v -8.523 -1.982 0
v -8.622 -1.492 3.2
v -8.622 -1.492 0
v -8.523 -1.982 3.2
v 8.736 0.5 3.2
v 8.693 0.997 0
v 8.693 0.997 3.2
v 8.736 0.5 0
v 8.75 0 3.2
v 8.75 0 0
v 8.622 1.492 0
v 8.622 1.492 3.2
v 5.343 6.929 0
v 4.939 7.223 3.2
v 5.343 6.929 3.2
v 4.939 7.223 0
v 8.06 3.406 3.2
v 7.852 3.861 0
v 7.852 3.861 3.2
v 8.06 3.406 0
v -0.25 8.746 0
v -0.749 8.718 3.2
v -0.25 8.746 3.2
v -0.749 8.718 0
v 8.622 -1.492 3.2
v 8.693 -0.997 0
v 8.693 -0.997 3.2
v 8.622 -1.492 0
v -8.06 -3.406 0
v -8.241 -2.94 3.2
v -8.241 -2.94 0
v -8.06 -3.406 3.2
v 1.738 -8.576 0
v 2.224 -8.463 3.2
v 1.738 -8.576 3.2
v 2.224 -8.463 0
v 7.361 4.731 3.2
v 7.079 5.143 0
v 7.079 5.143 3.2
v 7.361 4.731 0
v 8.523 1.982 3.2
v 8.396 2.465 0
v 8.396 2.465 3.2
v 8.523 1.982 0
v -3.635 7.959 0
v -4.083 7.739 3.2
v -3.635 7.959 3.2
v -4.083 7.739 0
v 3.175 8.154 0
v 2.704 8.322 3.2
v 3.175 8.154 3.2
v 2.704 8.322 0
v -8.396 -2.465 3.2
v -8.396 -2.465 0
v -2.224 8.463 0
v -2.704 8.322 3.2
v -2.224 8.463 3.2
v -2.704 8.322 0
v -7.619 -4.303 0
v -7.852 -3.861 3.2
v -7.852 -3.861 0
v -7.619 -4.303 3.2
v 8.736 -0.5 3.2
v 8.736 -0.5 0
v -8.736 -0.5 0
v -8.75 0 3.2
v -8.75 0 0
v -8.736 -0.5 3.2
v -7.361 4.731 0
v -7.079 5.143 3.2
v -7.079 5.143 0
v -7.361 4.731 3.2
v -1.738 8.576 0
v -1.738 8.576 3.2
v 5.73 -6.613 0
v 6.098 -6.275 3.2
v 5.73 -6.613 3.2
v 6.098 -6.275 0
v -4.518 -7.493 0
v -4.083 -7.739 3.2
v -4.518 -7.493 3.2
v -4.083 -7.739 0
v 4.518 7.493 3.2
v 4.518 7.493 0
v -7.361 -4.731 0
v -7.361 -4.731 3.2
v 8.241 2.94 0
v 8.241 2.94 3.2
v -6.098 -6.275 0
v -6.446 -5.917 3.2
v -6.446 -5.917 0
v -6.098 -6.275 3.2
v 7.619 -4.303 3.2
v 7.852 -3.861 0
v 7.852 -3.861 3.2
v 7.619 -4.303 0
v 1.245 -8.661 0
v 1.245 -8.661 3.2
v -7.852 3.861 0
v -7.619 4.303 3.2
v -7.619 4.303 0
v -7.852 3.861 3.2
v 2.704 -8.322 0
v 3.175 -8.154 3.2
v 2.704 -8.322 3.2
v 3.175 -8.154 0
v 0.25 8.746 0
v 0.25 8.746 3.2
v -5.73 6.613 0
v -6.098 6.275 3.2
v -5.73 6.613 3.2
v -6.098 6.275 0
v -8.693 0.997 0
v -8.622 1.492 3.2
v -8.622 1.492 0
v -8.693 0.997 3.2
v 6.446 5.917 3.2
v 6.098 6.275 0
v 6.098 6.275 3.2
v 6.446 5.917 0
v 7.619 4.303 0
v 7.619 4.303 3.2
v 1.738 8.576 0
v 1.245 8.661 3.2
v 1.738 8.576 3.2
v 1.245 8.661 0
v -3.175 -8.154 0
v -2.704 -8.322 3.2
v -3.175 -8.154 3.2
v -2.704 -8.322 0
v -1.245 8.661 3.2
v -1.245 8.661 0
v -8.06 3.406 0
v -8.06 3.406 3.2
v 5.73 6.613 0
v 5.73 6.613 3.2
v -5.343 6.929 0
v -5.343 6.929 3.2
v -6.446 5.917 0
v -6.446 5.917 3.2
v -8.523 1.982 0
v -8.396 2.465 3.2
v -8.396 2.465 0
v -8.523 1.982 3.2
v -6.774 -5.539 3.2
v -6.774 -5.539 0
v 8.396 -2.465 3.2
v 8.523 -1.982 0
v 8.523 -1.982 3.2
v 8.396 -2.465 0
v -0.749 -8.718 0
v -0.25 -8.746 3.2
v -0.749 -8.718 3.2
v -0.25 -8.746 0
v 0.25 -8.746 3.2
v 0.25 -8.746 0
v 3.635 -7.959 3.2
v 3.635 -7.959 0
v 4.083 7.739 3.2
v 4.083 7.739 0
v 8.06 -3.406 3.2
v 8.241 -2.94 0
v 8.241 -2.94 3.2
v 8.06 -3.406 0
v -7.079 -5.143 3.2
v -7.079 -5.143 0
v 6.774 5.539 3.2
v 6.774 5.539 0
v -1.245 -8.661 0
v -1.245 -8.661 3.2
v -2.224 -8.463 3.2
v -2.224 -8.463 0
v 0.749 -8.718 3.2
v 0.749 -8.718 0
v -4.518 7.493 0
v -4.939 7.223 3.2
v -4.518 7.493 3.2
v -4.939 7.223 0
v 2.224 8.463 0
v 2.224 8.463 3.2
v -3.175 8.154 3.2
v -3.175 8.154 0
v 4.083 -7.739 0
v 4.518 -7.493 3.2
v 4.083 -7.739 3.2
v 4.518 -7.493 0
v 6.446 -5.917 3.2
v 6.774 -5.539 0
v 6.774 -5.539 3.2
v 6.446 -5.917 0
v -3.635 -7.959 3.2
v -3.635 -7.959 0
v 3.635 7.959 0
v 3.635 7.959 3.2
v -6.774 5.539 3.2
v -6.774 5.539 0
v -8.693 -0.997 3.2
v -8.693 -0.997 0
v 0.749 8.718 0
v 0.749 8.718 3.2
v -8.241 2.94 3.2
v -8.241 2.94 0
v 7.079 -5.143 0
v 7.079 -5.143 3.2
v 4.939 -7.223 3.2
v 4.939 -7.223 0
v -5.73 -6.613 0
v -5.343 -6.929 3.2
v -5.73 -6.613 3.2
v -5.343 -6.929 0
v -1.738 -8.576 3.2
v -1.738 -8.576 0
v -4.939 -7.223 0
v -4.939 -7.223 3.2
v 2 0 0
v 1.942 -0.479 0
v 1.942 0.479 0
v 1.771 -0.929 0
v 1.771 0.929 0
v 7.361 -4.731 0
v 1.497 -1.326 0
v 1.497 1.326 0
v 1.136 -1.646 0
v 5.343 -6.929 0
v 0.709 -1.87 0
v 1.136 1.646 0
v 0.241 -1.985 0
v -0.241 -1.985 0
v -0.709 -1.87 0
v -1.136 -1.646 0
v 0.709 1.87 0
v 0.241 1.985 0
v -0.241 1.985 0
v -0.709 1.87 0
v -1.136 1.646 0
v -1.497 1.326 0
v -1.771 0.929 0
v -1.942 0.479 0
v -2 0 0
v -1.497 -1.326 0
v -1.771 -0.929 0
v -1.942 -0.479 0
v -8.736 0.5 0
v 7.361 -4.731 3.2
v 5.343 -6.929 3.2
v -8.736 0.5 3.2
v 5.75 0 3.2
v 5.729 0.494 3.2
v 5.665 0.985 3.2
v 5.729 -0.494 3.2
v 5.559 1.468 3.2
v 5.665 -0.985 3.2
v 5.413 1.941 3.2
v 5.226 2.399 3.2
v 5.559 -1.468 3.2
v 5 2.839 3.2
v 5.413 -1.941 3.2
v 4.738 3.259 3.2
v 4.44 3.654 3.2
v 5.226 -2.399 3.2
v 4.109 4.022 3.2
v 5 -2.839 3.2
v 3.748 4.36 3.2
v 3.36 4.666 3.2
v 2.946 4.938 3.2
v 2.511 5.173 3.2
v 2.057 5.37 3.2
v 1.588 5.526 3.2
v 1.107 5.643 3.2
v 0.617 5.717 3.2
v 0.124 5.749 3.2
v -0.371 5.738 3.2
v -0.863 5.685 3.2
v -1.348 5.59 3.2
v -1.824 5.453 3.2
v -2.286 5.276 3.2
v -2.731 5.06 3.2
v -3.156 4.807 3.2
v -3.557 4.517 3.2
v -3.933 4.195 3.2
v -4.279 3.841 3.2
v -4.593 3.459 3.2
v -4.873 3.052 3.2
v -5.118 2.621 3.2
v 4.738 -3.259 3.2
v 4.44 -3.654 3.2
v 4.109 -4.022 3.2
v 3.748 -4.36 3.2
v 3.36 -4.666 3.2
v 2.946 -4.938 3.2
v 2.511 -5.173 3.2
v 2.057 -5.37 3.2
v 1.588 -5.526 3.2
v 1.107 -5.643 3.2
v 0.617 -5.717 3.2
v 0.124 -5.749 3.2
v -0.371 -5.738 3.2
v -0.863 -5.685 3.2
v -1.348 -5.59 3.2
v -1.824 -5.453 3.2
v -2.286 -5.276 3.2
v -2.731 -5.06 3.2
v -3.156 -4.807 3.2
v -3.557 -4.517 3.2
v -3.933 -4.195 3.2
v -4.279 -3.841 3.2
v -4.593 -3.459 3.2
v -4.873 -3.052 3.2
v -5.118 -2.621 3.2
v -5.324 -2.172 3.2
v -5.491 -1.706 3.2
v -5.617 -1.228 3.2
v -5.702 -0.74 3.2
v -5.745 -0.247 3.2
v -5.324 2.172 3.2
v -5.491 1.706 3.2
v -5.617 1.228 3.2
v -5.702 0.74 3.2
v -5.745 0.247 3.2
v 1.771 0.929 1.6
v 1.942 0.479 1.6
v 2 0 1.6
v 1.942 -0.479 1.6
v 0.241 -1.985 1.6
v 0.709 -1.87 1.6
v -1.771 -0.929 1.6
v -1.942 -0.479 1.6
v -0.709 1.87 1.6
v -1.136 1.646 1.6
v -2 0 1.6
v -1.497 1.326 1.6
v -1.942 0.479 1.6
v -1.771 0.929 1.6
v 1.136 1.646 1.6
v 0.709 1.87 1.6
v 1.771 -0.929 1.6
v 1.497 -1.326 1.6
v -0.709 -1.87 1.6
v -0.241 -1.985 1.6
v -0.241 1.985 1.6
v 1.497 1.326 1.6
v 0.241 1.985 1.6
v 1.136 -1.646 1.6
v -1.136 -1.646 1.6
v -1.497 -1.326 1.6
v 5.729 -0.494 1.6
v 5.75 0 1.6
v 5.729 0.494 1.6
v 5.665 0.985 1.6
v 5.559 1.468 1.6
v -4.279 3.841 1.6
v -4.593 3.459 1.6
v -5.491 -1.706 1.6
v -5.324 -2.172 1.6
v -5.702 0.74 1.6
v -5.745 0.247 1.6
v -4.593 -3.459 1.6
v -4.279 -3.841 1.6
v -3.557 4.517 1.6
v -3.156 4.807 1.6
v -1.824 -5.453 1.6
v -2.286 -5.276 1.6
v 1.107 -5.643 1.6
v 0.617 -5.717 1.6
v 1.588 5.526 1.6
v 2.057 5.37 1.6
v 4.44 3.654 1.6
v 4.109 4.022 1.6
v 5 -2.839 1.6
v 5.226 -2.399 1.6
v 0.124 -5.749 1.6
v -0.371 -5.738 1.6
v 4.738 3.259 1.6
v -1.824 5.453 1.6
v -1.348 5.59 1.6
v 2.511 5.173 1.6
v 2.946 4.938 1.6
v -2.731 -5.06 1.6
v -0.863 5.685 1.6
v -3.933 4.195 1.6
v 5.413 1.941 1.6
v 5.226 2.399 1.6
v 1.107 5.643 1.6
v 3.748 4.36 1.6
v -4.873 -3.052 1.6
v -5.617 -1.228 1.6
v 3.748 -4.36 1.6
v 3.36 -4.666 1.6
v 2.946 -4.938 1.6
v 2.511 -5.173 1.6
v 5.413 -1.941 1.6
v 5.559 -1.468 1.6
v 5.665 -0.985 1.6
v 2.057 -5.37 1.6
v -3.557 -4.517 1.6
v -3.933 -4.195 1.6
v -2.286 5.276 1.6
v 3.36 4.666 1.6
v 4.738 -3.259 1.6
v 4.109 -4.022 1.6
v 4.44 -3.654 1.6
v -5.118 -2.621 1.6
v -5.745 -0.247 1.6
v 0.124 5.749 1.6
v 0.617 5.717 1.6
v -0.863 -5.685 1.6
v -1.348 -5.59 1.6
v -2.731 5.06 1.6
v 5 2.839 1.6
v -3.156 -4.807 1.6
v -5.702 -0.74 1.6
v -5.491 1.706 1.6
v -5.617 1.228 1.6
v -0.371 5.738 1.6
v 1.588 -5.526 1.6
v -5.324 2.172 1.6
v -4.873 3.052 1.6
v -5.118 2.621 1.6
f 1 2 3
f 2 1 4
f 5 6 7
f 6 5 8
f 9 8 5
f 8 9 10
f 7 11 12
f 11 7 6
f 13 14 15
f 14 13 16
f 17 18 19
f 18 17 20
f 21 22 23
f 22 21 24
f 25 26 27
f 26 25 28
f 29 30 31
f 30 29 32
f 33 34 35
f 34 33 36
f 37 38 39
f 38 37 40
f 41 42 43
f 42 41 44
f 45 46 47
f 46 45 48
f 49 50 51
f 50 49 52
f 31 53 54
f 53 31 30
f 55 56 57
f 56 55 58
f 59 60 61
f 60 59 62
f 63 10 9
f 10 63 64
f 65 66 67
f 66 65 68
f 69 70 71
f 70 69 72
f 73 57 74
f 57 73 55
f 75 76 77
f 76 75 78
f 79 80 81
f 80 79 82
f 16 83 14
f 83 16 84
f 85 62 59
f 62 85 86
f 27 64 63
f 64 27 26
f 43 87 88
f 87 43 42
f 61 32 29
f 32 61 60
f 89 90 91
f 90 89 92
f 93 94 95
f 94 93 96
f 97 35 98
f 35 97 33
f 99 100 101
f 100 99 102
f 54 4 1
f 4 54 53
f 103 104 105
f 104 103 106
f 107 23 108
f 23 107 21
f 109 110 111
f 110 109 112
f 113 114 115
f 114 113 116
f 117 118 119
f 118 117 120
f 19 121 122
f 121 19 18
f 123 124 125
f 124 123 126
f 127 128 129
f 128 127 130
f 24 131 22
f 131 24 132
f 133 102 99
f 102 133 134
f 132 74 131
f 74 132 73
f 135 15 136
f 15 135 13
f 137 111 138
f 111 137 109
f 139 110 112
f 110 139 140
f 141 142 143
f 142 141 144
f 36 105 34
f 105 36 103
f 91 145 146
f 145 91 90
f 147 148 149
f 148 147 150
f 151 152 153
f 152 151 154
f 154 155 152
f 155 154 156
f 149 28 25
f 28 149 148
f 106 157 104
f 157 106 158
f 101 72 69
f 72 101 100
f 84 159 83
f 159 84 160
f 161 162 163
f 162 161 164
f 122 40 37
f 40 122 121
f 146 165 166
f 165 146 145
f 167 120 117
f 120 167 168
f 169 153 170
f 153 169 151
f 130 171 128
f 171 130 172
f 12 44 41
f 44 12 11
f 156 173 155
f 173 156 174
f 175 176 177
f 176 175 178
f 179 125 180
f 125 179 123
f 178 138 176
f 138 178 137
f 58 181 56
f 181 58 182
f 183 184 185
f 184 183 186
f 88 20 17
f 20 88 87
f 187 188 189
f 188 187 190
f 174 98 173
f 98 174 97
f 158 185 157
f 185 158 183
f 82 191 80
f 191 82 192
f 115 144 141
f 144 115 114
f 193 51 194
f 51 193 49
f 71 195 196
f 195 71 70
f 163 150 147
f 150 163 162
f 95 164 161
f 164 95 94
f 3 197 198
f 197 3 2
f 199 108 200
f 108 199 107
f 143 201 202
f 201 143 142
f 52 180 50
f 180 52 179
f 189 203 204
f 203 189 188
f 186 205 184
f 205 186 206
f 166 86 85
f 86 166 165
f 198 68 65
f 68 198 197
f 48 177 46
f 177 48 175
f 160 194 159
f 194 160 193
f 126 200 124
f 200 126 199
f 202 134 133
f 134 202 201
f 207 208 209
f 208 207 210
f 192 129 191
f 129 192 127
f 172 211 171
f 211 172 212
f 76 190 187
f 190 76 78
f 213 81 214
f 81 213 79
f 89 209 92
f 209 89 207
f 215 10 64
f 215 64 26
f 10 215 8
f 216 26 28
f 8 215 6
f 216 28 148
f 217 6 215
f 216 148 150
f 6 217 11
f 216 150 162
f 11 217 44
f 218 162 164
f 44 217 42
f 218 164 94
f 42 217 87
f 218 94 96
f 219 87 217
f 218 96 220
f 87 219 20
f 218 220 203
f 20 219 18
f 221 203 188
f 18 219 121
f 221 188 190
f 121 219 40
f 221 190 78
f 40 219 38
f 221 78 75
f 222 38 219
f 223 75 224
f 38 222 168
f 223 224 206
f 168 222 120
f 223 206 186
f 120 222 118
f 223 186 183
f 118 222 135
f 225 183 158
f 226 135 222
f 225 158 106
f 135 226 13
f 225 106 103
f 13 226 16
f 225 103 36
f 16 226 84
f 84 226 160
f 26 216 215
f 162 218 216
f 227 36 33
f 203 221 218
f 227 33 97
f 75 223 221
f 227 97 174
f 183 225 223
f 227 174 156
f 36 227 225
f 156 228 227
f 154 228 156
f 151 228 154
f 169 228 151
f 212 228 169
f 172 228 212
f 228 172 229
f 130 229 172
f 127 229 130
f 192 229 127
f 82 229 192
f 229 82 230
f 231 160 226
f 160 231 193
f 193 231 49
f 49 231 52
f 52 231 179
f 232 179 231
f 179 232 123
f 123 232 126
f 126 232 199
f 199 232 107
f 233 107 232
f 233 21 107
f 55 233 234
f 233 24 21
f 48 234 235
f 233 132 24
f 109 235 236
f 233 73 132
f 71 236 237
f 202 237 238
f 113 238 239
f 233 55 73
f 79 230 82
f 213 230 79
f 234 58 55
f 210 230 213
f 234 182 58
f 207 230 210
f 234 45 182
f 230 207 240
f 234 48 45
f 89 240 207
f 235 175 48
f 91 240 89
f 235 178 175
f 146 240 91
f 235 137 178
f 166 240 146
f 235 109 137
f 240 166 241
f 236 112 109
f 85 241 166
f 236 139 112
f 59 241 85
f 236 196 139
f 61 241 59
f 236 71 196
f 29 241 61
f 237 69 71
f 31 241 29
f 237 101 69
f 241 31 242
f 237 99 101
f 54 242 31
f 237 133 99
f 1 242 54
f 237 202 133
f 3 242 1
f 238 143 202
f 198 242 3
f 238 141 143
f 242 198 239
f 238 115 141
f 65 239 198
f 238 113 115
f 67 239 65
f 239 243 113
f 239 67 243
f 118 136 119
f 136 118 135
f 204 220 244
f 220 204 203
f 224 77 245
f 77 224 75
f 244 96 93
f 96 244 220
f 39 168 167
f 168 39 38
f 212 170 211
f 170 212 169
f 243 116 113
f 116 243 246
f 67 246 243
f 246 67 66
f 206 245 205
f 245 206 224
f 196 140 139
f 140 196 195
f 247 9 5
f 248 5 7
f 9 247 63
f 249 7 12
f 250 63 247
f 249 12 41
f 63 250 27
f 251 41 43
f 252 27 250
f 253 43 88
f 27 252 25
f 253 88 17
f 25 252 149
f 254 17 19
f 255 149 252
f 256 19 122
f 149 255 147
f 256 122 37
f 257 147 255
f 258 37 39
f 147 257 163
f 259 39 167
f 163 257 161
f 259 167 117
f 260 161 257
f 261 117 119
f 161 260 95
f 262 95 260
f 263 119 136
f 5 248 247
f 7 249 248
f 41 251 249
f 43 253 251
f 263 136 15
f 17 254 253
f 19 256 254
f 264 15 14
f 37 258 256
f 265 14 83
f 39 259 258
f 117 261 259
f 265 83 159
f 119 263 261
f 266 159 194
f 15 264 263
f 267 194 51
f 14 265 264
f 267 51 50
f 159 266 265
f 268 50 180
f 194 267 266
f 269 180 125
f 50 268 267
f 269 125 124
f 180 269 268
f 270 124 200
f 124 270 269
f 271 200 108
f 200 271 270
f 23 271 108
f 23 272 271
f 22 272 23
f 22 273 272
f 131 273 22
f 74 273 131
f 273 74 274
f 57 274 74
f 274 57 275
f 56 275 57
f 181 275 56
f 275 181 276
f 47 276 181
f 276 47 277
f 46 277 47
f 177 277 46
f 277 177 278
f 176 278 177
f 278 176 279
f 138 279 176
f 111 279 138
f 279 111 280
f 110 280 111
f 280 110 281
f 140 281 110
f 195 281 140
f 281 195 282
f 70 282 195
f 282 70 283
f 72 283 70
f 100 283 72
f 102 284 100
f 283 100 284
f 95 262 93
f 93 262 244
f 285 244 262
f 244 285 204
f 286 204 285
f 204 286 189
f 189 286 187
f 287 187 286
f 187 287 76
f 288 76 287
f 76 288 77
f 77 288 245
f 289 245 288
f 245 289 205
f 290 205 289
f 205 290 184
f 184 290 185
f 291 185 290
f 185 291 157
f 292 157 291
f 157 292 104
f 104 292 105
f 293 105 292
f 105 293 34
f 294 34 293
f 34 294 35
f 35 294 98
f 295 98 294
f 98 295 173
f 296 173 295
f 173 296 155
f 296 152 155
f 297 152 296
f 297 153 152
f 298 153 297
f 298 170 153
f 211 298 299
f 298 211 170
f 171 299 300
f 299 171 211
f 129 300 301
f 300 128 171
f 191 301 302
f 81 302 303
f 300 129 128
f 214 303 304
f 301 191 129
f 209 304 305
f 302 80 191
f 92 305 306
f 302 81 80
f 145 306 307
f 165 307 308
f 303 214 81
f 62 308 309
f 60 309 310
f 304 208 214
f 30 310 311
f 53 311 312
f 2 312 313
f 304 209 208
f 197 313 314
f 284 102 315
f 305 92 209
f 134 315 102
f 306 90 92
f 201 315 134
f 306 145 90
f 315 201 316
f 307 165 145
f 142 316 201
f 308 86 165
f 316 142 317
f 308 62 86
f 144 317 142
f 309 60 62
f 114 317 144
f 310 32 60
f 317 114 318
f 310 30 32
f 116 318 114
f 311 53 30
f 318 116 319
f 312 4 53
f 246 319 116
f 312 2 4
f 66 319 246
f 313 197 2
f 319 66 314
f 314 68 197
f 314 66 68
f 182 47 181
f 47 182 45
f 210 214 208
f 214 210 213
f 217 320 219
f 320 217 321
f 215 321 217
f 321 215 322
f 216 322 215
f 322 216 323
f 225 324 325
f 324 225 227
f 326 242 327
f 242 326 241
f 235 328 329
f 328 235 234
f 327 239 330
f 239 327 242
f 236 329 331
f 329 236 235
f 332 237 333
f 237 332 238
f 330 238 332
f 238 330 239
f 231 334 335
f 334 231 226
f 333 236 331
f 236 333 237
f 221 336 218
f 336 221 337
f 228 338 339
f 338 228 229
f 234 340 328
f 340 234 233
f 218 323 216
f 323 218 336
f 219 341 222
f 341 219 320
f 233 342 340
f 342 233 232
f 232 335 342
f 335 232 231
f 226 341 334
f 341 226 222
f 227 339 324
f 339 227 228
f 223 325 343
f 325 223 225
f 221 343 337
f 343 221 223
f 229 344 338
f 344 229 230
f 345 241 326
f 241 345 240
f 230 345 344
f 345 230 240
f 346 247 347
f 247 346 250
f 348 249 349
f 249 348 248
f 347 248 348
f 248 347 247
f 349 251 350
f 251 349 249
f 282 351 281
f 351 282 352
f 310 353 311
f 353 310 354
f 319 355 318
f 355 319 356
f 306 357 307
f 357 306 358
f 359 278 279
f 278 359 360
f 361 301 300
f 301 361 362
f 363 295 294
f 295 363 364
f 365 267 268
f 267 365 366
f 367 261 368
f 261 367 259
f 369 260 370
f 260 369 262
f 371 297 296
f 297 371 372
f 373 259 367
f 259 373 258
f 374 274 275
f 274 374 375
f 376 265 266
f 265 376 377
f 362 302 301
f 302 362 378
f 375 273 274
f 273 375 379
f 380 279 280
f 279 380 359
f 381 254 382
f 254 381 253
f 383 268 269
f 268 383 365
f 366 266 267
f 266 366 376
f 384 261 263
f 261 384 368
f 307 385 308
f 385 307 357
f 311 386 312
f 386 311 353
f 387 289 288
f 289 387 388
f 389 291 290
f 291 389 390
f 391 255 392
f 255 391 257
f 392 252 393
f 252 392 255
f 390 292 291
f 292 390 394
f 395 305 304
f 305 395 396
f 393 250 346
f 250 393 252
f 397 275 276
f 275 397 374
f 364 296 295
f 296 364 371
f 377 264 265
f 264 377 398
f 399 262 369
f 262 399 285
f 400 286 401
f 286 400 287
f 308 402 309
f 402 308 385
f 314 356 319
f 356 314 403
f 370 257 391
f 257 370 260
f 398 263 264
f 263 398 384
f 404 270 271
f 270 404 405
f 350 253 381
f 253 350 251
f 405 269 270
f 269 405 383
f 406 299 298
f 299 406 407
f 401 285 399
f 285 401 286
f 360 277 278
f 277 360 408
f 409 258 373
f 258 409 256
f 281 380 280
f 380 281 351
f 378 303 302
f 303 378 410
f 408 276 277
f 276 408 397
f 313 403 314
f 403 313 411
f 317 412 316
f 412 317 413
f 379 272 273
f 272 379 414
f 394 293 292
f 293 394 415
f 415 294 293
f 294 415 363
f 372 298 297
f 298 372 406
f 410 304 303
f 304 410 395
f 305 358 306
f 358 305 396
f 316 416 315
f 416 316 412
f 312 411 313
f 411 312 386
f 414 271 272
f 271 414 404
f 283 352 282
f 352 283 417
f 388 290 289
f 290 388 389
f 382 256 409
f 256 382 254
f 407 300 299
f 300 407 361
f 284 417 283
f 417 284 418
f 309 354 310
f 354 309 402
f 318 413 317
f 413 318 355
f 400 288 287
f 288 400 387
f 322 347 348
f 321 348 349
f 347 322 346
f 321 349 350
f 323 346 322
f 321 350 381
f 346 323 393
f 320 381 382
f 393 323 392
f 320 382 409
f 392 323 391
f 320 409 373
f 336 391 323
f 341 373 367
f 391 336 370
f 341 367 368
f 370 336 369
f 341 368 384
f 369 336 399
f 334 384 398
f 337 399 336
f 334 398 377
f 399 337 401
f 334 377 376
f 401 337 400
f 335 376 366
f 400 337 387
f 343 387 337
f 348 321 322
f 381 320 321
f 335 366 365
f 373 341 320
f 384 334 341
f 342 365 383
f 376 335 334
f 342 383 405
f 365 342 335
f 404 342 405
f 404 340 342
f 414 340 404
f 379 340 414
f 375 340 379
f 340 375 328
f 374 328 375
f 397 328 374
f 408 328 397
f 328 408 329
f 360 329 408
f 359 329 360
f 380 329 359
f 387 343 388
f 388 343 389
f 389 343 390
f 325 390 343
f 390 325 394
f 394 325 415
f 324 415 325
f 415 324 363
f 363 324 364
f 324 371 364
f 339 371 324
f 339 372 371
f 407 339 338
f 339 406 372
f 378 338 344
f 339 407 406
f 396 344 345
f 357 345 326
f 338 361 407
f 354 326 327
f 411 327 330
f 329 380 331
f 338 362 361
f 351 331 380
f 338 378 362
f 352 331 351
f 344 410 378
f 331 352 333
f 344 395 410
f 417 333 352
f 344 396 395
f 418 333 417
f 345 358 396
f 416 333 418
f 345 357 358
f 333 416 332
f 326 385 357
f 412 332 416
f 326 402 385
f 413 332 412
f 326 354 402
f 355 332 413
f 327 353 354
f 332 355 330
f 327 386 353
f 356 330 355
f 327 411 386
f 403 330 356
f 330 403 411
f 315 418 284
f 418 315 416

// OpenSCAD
module washer (odia = 17.5, idia = 4, mdia = 11.5, d1 = 3.2, d2 = 1.6)
{
    difference () {
        cylinder (r = odia / 2, h = d1);
        translate ([0, 0, -d1])
            cylinder (r = idia / 2, h = 3 * d1);
        translate ([0, 0, d1 - d2])
            cylinder (r = mdia / 2, h = d1);
    }
}

washer ($fa=3, $fs=.5);
